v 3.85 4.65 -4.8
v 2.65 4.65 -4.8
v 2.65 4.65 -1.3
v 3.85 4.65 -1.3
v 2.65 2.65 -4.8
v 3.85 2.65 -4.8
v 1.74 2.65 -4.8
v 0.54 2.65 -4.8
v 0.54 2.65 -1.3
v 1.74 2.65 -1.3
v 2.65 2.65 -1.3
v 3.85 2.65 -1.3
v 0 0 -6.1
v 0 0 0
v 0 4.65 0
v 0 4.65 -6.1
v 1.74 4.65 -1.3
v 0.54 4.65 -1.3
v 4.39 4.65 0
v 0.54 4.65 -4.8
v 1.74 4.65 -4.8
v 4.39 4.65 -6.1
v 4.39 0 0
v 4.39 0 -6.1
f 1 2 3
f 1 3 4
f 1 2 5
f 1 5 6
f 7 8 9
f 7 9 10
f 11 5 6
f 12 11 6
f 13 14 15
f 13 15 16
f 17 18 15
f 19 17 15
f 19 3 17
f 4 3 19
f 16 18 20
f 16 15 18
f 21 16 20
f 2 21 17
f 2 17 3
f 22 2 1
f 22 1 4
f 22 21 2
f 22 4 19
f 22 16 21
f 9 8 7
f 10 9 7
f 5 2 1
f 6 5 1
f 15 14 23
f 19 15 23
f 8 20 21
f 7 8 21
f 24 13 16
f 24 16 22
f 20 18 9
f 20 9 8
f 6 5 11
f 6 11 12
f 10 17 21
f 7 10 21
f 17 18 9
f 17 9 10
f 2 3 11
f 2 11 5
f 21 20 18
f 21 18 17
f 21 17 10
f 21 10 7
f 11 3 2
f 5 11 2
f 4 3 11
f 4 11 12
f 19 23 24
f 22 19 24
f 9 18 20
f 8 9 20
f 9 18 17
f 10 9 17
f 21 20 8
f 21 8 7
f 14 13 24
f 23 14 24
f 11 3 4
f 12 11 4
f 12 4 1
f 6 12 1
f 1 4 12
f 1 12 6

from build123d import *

# Parameters (mm, degrees)
SKETCH1_W             = 4.39
SKETCH1_H             = 6.1
BOSS_EXTRUDE1_DEPTH   = 4.65
SKETCH2_W             = 1.2
SKETCH2_H             = 3.5
CUT_EXTRUDE1_DEPTH    = 2
SKETCH2_3_W           = 1.2
SKETCH2_3_H           = 3.5
BOSS_EXTRUDE2_DEPTH   = 2
BOSS_EXTRUDE2_2_DEPTH = 2


with BuildPart() as part:
    # Sketch1 → Boss-Extrude1 (new body)
    with BuildSketch(Plane(origin=(0, 0, 0), x_dir=(1, 0, 0), z_dir=(0, 1, 0))):
        with Locations((2.195, 3.05)):
            Rectangle(SKETCH1_W, SKETCH1_H)
    extrude(amount=BOSS_EXTRUDE1_DEPTH)

    # Sketch2 → Cut-Extrude1 (cut)
    with BuildSketch(Plane(origin=(0, 4.65, 0), x_dir=(1, 0, 0), z_dir=(0, 1, 0))):
        with Locations((1.14, 3.05)):
            Rectangle(SKETCH2_W, SKETCH2_H)
        with Locations((3.25, 3.05)):
            Rectangle(SKETCH2_W, SKETCH2_H)
    extrude(amount=-CUT_EXTRUDE1_DEPTH, mode=Mode.SUBTRACT)


with BuildPart() as body_2:
    # Sketch2<3> → Boss-Extrude2 (new body)
    with BuildSketch(Plane(origin=(0, 4.65, 0), x_dir=(1, 0, 0), z_dir=(0, 1, 0))):
        with Locations((1.14, 3.05)):
            Rectangle(SKETCH2_3_W, SKETCH2_3_H)
    extrude(amount=-BOSS_EXTRUDE2_DEPTH)


with BuildPart() as body_3:
    # Sketch2<3> → Boss-Extrude2 2 (new body)
    with BuildSketch(Plane(origin=(0, 4.65, 0), x_dir=(1, 0, 0), z_dir=(0, 1, 0))):
        with Locations((3.25, 3.05)):
            Rectangle(SKETCH2_3_W, SKETCH2_3_H)
    extrude(amount=-BOSS_EXTRUDE2_2_DEPTH)


solid = Compound([part.part, body_2.part, body_3.part])
